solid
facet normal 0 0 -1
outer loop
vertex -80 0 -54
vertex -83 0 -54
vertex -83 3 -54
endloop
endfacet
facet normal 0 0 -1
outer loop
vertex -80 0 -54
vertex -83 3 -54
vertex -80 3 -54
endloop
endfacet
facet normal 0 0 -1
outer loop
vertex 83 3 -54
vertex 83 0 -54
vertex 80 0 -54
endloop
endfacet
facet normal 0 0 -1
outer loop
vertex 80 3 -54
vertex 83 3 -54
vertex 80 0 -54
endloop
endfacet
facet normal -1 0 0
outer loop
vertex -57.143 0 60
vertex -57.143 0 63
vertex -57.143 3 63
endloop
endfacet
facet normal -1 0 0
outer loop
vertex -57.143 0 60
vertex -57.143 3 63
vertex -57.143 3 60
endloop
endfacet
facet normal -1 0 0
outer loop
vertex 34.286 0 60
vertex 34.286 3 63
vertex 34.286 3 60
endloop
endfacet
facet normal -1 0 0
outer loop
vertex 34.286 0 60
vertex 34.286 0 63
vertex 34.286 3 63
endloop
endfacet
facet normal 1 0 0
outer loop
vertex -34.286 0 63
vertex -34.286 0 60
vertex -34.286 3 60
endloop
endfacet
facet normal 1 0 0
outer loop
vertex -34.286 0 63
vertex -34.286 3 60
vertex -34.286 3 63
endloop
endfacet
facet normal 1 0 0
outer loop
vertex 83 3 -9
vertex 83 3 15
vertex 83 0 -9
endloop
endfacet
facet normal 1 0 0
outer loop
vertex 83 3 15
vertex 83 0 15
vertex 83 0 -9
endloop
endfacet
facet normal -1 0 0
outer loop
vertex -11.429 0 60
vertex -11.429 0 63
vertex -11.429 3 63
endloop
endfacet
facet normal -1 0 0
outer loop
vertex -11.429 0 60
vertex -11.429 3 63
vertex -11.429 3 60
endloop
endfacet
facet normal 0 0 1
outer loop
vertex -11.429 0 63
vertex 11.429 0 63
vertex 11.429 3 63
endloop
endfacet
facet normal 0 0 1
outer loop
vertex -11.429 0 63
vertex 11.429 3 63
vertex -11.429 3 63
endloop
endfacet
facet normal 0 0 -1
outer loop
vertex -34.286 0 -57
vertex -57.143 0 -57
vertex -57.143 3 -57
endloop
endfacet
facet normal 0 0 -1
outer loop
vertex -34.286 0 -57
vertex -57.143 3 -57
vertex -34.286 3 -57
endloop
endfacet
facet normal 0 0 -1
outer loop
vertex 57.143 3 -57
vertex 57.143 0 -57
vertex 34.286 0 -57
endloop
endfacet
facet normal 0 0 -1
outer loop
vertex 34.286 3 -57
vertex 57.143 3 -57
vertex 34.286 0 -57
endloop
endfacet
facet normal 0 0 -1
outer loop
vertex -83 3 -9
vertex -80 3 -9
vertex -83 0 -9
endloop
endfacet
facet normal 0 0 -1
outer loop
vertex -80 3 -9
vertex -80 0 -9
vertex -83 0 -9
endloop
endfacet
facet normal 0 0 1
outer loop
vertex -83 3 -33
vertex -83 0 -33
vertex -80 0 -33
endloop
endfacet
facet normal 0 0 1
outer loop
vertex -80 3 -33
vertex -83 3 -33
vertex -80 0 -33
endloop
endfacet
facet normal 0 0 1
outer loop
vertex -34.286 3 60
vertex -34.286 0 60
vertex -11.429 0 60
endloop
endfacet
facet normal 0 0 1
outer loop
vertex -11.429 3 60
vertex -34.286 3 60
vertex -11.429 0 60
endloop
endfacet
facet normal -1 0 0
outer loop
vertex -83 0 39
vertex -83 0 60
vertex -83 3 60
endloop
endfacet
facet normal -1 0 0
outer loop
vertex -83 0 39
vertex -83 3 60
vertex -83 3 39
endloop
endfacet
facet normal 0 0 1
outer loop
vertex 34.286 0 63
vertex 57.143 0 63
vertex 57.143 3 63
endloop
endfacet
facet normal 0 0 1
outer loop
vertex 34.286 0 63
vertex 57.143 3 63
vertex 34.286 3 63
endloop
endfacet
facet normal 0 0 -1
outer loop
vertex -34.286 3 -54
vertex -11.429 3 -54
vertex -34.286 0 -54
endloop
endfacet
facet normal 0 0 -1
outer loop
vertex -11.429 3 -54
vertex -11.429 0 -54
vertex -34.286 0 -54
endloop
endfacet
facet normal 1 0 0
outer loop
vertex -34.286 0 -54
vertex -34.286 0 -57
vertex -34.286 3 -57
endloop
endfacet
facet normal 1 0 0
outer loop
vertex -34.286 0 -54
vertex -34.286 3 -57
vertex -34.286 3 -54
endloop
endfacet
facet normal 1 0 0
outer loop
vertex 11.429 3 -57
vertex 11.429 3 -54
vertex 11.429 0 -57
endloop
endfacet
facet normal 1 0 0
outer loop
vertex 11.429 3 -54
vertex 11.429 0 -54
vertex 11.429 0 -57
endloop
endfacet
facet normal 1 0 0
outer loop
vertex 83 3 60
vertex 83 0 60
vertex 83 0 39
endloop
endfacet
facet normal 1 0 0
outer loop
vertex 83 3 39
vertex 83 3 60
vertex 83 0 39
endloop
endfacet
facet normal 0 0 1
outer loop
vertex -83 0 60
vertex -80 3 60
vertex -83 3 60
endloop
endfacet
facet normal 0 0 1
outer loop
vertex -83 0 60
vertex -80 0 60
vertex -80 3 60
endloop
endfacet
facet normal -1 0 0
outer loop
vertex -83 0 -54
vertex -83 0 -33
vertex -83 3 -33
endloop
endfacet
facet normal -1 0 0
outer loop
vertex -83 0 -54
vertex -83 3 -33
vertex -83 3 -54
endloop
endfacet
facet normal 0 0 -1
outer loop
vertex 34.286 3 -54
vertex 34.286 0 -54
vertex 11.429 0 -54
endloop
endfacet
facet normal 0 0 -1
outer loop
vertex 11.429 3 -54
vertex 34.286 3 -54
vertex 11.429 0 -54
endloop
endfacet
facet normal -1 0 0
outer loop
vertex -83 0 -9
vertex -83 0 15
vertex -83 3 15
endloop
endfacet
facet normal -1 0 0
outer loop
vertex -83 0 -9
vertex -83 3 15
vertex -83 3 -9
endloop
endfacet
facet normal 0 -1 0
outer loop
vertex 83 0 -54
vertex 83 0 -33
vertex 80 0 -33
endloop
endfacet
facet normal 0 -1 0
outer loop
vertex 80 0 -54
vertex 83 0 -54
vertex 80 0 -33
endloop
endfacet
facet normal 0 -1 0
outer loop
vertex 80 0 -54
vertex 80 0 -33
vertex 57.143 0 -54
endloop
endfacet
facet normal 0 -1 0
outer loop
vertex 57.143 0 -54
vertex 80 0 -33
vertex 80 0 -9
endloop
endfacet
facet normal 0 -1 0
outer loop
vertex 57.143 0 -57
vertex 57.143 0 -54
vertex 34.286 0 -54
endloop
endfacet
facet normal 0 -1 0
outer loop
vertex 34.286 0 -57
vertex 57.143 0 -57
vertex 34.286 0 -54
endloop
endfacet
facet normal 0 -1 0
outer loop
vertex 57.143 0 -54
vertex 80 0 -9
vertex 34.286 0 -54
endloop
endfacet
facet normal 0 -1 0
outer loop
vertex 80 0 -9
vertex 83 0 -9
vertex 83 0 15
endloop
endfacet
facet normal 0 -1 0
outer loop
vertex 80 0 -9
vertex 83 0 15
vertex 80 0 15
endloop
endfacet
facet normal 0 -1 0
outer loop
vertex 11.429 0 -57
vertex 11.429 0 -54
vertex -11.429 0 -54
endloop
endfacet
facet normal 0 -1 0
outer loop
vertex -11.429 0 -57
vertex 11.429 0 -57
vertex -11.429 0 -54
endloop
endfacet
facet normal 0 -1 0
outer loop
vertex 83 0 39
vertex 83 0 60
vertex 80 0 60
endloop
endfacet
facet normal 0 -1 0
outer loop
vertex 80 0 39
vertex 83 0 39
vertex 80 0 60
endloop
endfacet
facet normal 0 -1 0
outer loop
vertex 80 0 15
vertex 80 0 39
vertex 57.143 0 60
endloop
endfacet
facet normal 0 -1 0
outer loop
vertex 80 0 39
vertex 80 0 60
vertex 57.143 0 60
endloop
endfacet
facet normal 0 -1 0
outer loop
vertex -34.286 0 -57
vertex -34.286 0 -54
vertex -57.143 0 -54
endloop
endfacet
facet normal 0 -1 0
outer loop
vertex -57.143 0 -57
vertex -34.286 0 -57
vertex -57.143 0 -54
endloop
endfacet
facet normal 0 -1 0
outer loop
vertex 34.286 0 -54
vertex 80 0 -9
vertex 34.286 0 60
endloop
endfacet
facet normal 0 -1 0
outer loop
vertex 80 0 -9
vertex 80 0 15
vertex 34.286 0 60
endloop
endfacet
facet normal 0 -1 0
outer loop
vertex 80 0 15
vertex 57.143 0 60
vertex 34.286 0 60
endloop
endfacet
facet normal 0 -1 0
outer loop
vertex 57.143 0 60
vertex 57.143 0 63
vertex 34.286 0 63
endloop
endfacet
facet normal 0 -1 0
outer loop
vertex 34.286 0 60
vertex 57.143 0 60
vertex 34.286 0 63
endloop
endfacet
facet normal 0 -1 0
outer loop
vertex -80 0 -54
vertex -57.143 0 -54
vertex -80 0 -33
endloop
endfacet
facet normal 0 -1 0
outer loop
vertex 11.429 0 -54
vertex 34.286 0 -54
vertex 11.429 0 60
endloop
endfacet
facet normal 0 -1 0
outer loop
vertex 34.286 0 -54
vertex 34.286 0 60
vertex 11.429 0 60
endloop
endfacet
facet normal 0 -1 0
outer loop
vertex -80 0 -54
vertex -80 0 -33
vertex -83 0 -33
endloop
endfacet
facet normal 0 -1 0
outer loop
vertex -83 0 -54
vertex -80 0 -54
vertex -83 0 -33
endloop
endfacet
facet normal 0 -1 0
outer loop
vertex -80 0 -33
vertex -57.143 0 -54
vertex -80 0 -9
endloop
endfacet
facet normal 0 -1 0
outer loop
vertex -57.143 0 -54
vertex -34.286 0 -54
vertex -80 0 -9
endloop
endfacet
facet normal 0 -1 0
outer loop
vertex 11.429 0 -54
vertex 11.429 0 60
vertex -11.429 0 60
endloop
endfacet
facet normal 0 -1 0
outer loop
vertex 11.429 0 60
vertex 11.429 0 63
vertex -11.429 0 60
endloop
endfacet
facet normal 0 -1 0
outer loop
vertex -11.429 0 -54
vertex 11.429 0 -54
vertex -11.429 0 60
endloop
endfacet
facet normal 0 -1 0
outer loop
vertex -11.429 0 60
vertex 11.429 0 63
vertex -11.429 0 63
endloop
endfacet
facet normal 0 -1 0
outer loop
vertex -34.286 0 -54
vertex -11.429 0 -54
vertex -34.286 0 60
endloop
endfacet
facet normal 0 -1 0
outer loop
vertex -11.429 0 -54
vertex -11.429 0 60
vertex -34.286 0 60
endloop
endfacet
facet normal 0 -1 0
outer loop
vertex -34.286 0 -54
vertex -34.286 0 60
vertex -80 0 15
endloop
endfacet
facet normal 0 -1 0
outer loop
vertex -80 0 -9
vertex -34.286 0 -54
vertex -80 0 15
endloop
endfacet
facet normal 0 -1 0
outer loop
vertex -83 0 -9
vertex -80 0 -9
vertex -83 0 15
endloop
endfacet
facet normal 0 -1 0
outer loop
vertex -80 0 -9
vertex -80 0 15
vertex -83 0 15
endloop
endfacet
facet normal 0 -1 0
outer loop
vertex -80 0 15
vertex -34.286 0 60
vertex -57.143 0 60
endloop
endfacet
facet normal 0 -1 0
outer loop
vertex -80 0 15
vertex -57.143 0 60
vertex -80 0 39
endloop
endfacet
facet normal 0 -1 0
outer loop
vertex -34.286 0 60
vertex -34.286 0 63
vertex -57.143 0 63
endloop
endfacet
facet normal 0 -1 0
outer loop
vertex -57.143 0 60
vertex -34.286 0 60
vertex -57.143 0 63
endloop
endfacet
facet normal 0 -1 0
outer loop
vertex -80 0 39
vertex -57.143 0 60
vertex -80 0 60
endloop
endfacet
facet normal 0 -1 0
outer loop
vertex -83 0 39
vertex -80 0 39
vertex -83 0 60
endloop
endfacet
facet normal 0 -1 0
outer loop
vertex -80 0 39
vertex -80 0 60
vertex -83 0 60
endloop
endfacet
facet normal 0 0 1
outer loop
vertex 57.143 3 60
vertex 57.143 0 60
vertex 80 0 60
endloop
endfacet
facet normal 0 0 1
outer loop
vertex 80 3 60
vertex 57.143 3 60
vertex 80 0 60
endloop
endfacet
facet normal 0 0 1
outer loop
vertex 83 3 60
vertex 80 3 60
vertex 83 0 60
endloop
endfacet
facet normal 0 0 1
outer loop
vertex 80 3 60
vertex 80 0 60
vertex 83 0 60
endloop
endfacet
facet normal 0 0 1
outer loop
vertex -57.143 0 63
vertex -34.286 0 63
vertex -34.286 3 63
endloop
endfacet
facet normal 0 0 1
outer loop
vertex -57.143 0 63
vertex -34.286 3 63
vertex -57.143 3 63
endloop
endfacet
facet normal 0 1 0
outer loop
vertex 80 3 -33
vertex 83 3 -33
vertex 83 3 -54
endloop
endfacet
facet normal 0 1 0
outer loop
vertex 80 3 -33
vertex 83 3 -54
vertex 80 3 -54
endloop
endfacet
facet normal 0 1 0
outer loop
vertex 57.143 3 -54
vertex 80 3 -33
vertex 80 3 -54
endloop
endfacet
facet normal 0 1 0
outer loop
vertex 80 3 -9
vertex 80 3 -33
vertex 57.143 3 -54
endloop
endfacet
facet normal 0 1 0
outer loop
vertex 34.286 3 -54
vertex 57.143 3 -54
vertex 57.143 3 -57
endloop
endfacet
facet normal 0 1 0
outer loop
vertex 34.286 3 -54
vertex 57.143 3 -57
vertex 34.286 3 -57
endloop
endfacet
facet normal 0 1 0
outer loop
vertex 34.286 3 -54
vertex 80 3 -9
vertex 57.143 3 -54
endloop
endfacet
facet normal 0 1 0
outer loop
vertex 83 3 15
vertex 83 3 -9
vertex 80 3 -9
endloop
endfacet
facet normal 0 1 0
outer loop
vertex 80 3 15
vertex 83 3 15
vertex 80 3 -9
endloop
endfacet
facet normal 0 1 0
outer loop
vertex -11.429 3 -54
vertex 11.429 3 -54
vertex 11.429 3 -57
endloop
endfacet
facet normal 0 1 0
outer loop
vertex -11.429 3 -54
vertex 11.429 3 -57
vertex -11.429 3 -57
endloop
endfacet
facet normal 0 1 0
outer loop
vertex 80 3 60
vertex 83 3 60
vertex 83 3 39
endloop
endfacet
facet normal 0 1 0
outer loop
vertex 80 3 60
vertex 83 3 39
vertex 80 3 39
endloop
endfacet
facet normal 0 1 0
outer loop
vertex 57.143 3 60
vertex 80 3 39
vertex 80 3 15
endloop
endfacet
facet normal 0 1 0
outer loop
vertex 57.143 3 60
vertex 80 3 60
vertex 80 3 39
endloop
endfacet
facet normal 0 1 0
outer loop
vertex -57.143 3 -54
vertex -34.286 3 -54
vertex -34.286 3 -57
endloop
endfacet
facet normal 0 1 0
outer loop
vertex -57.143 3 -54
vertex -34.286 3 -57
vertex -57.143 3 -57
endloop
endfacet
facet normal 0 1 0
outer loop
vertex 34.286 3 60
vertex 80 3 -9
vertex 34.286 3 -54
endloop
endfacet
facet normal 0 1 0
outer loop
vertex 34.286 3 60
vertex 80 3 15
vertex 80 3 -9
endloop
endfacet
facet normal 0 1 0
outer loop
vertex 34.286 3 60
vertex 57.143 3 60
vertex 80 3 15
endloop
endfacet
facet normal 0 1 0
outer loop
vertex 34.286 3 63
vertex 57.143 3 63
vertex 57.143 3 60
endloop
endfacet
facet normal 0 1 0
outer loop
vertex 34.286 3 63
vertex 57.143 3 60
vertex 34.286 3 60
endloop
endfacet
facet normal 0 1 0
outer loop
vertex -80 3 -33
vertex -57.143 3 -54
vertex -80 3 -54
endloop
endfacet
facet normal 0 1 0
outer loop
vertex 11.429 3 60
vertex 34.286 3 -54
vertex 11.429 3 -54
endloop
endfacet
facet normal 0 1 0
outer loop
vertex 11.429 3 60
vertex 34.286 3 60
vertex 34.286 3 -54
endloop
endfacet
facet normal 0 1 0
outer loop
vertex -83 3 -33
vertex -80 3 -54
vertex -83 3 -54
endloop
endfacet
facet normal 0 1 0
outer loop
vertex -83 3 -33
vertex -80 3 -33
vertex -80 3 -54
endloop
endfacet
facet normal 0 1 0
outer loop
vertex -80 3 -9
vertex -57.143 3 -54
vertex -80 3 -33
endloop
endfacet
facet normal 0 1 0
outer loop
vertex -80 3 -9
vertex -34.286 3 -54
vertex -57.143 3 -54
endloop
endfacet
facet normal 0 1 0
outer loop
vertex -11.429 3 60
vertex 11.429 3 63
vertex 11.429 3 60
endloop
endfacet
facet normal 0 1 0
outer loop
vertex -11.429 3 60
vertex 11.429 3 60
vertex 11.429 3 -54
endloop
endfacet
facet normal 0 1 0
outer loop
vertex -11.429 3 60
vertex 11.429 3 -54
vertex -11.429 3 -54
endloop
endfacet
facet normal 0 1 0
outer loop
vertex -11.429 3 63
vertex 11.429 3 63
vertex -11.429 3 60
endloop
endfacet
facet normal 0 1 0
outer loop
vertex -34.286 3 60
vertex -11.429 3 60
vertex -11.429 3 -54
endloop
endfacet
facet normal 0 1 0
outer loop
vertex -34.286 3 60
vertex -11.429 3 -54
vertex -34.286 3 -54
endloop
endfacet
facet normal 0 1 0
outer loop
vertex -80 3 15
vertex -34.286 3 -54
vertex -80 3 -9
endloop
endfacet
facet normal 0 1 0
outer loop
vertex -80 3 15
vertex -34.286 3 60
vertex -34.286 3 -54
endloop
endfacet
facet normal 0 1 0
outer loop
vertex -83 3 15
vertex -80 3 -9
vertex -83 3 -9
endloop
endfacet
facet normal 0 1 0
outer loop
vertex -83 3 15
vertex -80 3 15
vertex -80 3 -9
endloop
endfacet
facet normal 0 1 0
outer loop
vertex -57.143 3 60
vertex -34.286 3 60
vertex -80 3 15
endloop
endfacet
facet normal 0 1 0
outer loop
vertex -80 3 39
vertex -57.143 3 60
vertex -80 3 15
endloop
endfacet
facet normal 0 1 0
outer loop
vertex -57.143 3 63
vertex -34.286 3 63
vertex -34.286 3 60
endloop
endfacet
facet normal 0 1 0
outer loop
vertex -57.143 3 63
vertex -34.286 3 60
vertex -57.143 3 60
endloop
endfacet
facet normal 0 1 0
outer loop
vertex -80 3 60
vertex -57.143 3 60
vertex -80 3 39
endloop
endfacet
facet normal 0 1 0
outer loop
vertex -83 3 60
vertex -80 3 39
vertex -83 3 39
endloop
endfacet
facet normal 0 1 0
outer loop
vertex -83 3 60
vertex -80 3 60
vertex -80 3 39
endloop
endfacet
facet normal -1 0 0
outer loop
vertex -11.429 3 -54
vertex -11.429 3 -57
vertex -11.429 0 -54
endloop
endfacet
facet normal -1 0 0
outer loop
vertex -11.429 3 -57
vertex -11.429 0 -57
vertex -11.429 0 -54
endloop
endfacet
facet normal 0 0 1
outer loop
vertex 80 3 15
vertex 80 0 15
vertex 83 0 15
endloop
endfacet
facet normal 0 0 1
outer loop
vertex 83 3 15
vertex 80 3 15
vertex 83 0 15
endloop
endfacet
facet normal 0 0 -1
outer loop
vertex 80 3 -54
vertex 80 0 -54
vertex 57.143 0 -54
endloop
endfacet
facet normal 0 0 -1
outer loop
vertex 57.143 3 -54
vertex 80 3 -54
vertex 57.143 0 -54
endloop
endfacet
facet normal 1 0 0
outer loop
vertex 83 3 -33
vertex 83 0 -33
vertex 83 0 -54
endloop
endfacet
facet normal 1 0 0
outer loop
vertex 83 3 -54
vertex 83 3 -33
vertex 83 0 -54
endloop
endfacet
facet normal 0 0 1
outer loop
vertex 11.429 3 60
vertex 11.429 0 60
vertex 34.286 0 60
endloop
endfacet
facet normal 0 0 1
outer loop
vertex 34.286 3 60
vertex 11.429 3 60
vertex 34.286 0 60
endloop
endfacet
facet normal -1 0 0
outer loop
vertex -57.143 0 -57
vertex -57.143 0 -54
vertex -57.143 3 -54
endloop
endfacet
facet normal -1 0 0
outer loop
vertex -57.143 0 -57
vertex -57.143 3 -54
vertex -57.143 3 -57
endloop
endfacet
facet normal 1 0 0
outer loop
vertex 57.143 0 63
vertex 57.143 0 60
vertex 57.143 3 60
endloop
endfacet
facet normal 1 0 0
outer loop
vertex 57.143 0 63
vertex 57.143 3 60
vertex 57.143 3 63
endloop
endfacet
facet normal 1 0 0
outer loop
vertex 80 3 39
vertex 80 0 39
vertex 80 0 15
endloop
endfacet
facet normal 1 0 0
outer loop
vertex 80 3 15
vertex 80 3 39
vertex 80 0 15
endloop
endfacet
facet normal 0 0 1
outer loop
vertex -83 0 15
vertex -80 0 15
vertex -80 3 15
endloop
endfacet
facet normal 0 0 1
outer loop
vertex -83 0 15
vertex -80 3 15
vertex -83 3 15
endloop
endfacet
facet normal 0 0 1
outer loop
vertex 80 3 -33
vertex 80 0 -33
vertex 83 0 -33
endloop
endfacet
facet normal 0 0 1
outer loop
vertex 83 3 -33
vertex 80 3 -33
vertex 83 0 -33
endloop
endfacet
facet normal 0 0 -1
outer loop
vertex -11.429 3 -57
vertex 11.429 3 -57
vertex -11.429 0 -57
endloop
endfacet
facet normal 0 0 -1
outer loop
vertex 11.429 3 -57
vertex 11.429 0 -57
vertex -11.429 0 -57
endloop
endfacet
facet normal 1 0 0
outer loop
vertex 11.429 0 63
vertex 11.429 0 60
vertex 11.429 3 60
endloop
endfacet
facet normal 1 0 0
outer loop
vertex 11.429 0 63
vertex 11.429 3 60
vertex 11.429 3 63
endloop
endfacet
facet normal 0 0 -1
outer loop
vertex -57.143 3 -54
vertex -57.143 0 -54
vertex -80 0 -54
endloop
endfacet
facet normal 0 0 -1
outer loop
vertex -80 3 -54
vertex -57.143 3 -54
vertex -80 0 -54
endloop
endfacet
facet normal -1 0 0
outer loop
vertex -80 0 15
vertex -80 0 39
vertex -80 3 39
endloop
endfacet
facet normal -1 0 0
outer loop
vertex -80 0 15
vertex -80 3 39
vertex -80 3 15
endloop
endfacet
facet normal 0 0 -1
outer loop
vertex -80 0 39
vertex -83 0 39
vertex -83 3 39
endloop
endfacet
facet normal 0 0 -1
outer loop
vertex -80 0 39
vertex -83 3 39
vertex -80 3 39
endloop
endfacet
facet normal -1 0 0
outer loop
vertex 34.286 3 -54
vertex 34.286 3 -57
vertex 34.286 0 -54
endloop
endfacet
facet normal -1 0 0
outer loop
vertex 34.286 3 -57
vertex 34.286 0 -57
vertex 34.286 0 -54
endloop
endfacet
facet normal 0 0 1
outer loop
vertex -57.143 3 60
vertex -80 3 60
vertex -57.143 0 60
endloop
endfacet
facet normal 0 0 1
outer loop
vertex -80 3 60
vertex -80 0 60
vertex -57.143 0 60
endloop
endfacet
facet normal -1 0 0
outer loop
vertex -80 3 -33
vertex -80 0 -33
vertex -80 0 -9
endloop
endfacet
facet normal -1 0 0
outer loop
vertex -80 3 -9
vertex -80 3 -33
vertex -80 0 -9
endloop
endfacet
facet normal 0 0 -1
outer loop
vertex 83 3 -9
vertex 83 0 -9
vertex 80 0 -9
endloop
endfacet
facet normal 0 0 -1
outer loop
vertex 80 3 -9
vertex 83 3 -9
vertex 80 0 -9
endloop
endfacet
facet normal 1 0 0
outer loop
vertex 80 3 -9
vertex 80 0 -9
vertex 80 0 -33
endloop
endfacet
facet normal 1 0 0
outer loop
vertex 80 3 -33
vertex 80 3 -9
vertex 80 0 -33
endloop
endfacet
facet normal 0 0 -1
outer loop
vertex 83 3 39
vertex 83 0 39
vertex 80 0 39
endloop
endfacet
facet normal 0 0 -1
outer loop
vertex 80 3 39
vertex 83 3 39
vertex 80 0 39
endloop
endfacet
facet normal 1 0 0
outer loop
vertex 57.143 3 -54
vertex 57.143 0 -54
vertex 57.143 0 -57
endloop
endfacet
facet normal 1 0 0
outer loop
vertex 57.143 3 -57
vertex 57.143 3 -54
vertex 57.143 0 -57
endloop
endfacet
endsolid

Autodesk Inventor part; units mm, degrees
ref_plane "YZ Plane" through (0, 0, 0) normal (1, 0, 0) x (0, 1, 0)
ref_plane "XZ Plane" through (0, 0, 0) normal (0, 1, 0) x (-1, 0, 0)
ref_plane "XY Plane" through (0, 0, 0) normal (0, 0, 1) x (1, 0, 0)
sketch "Sketch1" plane through (0, 0, 0) normal (0, 1, 0) x (-1, 0, 0)
  line L0 (-11.4286, -54) -> (-11.4286, -57)
  line L1 (-11.4286, -57) -> (11.4286, -57)
  line L2 (11.4286, -57) -> (11.4286, -54)
  line L3 (-57.1429, -54) -> (-57.1429, -57)
  line L4 (-57.1429, -57) -> (-34.2857, -57)
  line L5 (-34.2857, -57) -> (-34.2857, -54)
  line L6 (57.1429, -54) -> (57.1429, -57)
  line L7 (57.1429, -57) -> (34.2857, -57)
  line L8 (34.2857, -57) -> (34.2857, -54)
  line L9 (34.2857, 60) -> (34.2857, 63)
  line L10 (34.2857, 63) -> (57.1429, 63)
  line L11 (57.1429, 63) -> (57.1429, 60)
  line L12 (-11.4286, 60) -> (-11.4286, 63)
  line L13 (-11.4286, 63) -> (11.4286, 63)
  line L14 (11.4286, 63) -> (11.4286, 60)
  line L15 (-57.1429, 60) -> (-57.1429, 63)
  line L16 (-57.1429, 63) -> (-34.2857, 63)
  line L17 (-34.2857, 63) -> (-34.2857, 60)
  line L18 (80, 60) -> (83, 60)
  line L19 (83, -54) -> (80, -54)
  line L20 (-80, 60) -> (-83, 60)
  line L21 (-83, -54) -> (-80, -54)
  line L22 (80, -54) -> (80, -54)
  line L23 (80, 60) -> (80, 60)
  line L24 (57.1429, -54) -> (80, -54)
  line L25 (11.4286, -54) -> (34.2857, -54)
  line L26 (-80, -54) -> (-57.1429, -54)
  line L27 (-34.2857, -54) -> (-11.4286, -54)
  line L28 (-80, 60) -> (-80, 60)
  line L29 (-80, -54) -> (-80, -54)
  line L30 (-57.1429, 60) -> (-80, 60)
  line L31 (-11.4286, 60) -> (-34.2857, 60)
  line L32 (80, 60) -> (57.1429, 60)
  line L33 (34.2857, 60) -> (11.4286, 60)
  line L34 (83, -33) -> (80, -33)
  line L35 (80, -33) -> (80, -9)
  line L36 (80, -9) -> (83, -9)
  line L37 (83, 39) -> (80, 39)
  line L38 (80, 39) -> (80, 15)
  line L39 (80, 15) -> (83, 15)
  line L40 (-83, 39) -> (-80, 39)
  line L41 (-80, 39) -> (-80, 15)
  line L42 (-80, 15) -> (-83, 15)
  line L43 (-83, -9) -> (-80, -9)
  line L44 (-80, -9) -> (-80, -33)
  line L45 (-80, -33) -> (-83, -33)
  line L46 (83, -33) -> (83, -54)
  line L47 (83, 60) -> (83, 39)
  line L48 (83, 15) -> (83, -9)
  line L49 (-83, 60) -> (-83, 39)
  line L50 (-83, 15) -> (-83, -9)
  line L51 (-83, -33) -> (-83, -54)
  point P0 (0, 0)
  dimension "d40" = 160
  dimension "d47" = 22.8571
  dimension "d48" = 22.8571
  dimension "d49" = 3
  dimension "d50" = 3
  dimension "d51" = 3
  dimension "d52" = 3
  dimension "d53" = 3
  dimension "d54" = 3
  dimension "d55" = 80
  dimension "d56" = 60
  dimension "d57" = 114
  dimension "d58" = 0
  dimension "d59" = 0
  dimension "d61" = 24
  dimension "d62" = 24
  dimension "d63" = 24
  dimension "d64" = 3
extrude "Extrusion1" add sketch "Sketch1" along normal blind 3
equation "\"d40\" = shelfW"
equation "\"d47\" = 0.142857 * shelfW + 2 * tol"
equation "\"d48\" = 0.142857 * shelfW - 2 * tol"
equation "\"d49\" = tt"
equation "\"d50\" = tt"
equation "\"d51\" = tt"
equation "\"d52\" = tt"
equation "\"d53\" = tt"
equation "\"d54\" = tt"
equation "\"d55\" = 0.5 * shelfW"
equation "\"d56\" = 0.5 * ht"
equation "\"d57\" = -2 * tt + ht"
equation "\"d61\" = 0.2 * ht - tol"
equation "\"d62\" = 0.2 * ht + 2 * tol"
equation "\"d63\" = 0.2 * ht - 2 * tol"
equation "\"d64\" = tt"
equation "\"d31\" = tt"
equation "\"d4\" = tt"
equation "\"tt\" = 3"
equation "\"tol\" = 0"
equation "\"tiroir\" = 1"
equation "\"nHoles\" = 4"
equation "\"shelfW\" = 160"
equation "\"shelfH\" = 35"
equation "\"d43\" = 0.5 * shelfH"
equation "\"ht\" = 120"
properties part number "base"
